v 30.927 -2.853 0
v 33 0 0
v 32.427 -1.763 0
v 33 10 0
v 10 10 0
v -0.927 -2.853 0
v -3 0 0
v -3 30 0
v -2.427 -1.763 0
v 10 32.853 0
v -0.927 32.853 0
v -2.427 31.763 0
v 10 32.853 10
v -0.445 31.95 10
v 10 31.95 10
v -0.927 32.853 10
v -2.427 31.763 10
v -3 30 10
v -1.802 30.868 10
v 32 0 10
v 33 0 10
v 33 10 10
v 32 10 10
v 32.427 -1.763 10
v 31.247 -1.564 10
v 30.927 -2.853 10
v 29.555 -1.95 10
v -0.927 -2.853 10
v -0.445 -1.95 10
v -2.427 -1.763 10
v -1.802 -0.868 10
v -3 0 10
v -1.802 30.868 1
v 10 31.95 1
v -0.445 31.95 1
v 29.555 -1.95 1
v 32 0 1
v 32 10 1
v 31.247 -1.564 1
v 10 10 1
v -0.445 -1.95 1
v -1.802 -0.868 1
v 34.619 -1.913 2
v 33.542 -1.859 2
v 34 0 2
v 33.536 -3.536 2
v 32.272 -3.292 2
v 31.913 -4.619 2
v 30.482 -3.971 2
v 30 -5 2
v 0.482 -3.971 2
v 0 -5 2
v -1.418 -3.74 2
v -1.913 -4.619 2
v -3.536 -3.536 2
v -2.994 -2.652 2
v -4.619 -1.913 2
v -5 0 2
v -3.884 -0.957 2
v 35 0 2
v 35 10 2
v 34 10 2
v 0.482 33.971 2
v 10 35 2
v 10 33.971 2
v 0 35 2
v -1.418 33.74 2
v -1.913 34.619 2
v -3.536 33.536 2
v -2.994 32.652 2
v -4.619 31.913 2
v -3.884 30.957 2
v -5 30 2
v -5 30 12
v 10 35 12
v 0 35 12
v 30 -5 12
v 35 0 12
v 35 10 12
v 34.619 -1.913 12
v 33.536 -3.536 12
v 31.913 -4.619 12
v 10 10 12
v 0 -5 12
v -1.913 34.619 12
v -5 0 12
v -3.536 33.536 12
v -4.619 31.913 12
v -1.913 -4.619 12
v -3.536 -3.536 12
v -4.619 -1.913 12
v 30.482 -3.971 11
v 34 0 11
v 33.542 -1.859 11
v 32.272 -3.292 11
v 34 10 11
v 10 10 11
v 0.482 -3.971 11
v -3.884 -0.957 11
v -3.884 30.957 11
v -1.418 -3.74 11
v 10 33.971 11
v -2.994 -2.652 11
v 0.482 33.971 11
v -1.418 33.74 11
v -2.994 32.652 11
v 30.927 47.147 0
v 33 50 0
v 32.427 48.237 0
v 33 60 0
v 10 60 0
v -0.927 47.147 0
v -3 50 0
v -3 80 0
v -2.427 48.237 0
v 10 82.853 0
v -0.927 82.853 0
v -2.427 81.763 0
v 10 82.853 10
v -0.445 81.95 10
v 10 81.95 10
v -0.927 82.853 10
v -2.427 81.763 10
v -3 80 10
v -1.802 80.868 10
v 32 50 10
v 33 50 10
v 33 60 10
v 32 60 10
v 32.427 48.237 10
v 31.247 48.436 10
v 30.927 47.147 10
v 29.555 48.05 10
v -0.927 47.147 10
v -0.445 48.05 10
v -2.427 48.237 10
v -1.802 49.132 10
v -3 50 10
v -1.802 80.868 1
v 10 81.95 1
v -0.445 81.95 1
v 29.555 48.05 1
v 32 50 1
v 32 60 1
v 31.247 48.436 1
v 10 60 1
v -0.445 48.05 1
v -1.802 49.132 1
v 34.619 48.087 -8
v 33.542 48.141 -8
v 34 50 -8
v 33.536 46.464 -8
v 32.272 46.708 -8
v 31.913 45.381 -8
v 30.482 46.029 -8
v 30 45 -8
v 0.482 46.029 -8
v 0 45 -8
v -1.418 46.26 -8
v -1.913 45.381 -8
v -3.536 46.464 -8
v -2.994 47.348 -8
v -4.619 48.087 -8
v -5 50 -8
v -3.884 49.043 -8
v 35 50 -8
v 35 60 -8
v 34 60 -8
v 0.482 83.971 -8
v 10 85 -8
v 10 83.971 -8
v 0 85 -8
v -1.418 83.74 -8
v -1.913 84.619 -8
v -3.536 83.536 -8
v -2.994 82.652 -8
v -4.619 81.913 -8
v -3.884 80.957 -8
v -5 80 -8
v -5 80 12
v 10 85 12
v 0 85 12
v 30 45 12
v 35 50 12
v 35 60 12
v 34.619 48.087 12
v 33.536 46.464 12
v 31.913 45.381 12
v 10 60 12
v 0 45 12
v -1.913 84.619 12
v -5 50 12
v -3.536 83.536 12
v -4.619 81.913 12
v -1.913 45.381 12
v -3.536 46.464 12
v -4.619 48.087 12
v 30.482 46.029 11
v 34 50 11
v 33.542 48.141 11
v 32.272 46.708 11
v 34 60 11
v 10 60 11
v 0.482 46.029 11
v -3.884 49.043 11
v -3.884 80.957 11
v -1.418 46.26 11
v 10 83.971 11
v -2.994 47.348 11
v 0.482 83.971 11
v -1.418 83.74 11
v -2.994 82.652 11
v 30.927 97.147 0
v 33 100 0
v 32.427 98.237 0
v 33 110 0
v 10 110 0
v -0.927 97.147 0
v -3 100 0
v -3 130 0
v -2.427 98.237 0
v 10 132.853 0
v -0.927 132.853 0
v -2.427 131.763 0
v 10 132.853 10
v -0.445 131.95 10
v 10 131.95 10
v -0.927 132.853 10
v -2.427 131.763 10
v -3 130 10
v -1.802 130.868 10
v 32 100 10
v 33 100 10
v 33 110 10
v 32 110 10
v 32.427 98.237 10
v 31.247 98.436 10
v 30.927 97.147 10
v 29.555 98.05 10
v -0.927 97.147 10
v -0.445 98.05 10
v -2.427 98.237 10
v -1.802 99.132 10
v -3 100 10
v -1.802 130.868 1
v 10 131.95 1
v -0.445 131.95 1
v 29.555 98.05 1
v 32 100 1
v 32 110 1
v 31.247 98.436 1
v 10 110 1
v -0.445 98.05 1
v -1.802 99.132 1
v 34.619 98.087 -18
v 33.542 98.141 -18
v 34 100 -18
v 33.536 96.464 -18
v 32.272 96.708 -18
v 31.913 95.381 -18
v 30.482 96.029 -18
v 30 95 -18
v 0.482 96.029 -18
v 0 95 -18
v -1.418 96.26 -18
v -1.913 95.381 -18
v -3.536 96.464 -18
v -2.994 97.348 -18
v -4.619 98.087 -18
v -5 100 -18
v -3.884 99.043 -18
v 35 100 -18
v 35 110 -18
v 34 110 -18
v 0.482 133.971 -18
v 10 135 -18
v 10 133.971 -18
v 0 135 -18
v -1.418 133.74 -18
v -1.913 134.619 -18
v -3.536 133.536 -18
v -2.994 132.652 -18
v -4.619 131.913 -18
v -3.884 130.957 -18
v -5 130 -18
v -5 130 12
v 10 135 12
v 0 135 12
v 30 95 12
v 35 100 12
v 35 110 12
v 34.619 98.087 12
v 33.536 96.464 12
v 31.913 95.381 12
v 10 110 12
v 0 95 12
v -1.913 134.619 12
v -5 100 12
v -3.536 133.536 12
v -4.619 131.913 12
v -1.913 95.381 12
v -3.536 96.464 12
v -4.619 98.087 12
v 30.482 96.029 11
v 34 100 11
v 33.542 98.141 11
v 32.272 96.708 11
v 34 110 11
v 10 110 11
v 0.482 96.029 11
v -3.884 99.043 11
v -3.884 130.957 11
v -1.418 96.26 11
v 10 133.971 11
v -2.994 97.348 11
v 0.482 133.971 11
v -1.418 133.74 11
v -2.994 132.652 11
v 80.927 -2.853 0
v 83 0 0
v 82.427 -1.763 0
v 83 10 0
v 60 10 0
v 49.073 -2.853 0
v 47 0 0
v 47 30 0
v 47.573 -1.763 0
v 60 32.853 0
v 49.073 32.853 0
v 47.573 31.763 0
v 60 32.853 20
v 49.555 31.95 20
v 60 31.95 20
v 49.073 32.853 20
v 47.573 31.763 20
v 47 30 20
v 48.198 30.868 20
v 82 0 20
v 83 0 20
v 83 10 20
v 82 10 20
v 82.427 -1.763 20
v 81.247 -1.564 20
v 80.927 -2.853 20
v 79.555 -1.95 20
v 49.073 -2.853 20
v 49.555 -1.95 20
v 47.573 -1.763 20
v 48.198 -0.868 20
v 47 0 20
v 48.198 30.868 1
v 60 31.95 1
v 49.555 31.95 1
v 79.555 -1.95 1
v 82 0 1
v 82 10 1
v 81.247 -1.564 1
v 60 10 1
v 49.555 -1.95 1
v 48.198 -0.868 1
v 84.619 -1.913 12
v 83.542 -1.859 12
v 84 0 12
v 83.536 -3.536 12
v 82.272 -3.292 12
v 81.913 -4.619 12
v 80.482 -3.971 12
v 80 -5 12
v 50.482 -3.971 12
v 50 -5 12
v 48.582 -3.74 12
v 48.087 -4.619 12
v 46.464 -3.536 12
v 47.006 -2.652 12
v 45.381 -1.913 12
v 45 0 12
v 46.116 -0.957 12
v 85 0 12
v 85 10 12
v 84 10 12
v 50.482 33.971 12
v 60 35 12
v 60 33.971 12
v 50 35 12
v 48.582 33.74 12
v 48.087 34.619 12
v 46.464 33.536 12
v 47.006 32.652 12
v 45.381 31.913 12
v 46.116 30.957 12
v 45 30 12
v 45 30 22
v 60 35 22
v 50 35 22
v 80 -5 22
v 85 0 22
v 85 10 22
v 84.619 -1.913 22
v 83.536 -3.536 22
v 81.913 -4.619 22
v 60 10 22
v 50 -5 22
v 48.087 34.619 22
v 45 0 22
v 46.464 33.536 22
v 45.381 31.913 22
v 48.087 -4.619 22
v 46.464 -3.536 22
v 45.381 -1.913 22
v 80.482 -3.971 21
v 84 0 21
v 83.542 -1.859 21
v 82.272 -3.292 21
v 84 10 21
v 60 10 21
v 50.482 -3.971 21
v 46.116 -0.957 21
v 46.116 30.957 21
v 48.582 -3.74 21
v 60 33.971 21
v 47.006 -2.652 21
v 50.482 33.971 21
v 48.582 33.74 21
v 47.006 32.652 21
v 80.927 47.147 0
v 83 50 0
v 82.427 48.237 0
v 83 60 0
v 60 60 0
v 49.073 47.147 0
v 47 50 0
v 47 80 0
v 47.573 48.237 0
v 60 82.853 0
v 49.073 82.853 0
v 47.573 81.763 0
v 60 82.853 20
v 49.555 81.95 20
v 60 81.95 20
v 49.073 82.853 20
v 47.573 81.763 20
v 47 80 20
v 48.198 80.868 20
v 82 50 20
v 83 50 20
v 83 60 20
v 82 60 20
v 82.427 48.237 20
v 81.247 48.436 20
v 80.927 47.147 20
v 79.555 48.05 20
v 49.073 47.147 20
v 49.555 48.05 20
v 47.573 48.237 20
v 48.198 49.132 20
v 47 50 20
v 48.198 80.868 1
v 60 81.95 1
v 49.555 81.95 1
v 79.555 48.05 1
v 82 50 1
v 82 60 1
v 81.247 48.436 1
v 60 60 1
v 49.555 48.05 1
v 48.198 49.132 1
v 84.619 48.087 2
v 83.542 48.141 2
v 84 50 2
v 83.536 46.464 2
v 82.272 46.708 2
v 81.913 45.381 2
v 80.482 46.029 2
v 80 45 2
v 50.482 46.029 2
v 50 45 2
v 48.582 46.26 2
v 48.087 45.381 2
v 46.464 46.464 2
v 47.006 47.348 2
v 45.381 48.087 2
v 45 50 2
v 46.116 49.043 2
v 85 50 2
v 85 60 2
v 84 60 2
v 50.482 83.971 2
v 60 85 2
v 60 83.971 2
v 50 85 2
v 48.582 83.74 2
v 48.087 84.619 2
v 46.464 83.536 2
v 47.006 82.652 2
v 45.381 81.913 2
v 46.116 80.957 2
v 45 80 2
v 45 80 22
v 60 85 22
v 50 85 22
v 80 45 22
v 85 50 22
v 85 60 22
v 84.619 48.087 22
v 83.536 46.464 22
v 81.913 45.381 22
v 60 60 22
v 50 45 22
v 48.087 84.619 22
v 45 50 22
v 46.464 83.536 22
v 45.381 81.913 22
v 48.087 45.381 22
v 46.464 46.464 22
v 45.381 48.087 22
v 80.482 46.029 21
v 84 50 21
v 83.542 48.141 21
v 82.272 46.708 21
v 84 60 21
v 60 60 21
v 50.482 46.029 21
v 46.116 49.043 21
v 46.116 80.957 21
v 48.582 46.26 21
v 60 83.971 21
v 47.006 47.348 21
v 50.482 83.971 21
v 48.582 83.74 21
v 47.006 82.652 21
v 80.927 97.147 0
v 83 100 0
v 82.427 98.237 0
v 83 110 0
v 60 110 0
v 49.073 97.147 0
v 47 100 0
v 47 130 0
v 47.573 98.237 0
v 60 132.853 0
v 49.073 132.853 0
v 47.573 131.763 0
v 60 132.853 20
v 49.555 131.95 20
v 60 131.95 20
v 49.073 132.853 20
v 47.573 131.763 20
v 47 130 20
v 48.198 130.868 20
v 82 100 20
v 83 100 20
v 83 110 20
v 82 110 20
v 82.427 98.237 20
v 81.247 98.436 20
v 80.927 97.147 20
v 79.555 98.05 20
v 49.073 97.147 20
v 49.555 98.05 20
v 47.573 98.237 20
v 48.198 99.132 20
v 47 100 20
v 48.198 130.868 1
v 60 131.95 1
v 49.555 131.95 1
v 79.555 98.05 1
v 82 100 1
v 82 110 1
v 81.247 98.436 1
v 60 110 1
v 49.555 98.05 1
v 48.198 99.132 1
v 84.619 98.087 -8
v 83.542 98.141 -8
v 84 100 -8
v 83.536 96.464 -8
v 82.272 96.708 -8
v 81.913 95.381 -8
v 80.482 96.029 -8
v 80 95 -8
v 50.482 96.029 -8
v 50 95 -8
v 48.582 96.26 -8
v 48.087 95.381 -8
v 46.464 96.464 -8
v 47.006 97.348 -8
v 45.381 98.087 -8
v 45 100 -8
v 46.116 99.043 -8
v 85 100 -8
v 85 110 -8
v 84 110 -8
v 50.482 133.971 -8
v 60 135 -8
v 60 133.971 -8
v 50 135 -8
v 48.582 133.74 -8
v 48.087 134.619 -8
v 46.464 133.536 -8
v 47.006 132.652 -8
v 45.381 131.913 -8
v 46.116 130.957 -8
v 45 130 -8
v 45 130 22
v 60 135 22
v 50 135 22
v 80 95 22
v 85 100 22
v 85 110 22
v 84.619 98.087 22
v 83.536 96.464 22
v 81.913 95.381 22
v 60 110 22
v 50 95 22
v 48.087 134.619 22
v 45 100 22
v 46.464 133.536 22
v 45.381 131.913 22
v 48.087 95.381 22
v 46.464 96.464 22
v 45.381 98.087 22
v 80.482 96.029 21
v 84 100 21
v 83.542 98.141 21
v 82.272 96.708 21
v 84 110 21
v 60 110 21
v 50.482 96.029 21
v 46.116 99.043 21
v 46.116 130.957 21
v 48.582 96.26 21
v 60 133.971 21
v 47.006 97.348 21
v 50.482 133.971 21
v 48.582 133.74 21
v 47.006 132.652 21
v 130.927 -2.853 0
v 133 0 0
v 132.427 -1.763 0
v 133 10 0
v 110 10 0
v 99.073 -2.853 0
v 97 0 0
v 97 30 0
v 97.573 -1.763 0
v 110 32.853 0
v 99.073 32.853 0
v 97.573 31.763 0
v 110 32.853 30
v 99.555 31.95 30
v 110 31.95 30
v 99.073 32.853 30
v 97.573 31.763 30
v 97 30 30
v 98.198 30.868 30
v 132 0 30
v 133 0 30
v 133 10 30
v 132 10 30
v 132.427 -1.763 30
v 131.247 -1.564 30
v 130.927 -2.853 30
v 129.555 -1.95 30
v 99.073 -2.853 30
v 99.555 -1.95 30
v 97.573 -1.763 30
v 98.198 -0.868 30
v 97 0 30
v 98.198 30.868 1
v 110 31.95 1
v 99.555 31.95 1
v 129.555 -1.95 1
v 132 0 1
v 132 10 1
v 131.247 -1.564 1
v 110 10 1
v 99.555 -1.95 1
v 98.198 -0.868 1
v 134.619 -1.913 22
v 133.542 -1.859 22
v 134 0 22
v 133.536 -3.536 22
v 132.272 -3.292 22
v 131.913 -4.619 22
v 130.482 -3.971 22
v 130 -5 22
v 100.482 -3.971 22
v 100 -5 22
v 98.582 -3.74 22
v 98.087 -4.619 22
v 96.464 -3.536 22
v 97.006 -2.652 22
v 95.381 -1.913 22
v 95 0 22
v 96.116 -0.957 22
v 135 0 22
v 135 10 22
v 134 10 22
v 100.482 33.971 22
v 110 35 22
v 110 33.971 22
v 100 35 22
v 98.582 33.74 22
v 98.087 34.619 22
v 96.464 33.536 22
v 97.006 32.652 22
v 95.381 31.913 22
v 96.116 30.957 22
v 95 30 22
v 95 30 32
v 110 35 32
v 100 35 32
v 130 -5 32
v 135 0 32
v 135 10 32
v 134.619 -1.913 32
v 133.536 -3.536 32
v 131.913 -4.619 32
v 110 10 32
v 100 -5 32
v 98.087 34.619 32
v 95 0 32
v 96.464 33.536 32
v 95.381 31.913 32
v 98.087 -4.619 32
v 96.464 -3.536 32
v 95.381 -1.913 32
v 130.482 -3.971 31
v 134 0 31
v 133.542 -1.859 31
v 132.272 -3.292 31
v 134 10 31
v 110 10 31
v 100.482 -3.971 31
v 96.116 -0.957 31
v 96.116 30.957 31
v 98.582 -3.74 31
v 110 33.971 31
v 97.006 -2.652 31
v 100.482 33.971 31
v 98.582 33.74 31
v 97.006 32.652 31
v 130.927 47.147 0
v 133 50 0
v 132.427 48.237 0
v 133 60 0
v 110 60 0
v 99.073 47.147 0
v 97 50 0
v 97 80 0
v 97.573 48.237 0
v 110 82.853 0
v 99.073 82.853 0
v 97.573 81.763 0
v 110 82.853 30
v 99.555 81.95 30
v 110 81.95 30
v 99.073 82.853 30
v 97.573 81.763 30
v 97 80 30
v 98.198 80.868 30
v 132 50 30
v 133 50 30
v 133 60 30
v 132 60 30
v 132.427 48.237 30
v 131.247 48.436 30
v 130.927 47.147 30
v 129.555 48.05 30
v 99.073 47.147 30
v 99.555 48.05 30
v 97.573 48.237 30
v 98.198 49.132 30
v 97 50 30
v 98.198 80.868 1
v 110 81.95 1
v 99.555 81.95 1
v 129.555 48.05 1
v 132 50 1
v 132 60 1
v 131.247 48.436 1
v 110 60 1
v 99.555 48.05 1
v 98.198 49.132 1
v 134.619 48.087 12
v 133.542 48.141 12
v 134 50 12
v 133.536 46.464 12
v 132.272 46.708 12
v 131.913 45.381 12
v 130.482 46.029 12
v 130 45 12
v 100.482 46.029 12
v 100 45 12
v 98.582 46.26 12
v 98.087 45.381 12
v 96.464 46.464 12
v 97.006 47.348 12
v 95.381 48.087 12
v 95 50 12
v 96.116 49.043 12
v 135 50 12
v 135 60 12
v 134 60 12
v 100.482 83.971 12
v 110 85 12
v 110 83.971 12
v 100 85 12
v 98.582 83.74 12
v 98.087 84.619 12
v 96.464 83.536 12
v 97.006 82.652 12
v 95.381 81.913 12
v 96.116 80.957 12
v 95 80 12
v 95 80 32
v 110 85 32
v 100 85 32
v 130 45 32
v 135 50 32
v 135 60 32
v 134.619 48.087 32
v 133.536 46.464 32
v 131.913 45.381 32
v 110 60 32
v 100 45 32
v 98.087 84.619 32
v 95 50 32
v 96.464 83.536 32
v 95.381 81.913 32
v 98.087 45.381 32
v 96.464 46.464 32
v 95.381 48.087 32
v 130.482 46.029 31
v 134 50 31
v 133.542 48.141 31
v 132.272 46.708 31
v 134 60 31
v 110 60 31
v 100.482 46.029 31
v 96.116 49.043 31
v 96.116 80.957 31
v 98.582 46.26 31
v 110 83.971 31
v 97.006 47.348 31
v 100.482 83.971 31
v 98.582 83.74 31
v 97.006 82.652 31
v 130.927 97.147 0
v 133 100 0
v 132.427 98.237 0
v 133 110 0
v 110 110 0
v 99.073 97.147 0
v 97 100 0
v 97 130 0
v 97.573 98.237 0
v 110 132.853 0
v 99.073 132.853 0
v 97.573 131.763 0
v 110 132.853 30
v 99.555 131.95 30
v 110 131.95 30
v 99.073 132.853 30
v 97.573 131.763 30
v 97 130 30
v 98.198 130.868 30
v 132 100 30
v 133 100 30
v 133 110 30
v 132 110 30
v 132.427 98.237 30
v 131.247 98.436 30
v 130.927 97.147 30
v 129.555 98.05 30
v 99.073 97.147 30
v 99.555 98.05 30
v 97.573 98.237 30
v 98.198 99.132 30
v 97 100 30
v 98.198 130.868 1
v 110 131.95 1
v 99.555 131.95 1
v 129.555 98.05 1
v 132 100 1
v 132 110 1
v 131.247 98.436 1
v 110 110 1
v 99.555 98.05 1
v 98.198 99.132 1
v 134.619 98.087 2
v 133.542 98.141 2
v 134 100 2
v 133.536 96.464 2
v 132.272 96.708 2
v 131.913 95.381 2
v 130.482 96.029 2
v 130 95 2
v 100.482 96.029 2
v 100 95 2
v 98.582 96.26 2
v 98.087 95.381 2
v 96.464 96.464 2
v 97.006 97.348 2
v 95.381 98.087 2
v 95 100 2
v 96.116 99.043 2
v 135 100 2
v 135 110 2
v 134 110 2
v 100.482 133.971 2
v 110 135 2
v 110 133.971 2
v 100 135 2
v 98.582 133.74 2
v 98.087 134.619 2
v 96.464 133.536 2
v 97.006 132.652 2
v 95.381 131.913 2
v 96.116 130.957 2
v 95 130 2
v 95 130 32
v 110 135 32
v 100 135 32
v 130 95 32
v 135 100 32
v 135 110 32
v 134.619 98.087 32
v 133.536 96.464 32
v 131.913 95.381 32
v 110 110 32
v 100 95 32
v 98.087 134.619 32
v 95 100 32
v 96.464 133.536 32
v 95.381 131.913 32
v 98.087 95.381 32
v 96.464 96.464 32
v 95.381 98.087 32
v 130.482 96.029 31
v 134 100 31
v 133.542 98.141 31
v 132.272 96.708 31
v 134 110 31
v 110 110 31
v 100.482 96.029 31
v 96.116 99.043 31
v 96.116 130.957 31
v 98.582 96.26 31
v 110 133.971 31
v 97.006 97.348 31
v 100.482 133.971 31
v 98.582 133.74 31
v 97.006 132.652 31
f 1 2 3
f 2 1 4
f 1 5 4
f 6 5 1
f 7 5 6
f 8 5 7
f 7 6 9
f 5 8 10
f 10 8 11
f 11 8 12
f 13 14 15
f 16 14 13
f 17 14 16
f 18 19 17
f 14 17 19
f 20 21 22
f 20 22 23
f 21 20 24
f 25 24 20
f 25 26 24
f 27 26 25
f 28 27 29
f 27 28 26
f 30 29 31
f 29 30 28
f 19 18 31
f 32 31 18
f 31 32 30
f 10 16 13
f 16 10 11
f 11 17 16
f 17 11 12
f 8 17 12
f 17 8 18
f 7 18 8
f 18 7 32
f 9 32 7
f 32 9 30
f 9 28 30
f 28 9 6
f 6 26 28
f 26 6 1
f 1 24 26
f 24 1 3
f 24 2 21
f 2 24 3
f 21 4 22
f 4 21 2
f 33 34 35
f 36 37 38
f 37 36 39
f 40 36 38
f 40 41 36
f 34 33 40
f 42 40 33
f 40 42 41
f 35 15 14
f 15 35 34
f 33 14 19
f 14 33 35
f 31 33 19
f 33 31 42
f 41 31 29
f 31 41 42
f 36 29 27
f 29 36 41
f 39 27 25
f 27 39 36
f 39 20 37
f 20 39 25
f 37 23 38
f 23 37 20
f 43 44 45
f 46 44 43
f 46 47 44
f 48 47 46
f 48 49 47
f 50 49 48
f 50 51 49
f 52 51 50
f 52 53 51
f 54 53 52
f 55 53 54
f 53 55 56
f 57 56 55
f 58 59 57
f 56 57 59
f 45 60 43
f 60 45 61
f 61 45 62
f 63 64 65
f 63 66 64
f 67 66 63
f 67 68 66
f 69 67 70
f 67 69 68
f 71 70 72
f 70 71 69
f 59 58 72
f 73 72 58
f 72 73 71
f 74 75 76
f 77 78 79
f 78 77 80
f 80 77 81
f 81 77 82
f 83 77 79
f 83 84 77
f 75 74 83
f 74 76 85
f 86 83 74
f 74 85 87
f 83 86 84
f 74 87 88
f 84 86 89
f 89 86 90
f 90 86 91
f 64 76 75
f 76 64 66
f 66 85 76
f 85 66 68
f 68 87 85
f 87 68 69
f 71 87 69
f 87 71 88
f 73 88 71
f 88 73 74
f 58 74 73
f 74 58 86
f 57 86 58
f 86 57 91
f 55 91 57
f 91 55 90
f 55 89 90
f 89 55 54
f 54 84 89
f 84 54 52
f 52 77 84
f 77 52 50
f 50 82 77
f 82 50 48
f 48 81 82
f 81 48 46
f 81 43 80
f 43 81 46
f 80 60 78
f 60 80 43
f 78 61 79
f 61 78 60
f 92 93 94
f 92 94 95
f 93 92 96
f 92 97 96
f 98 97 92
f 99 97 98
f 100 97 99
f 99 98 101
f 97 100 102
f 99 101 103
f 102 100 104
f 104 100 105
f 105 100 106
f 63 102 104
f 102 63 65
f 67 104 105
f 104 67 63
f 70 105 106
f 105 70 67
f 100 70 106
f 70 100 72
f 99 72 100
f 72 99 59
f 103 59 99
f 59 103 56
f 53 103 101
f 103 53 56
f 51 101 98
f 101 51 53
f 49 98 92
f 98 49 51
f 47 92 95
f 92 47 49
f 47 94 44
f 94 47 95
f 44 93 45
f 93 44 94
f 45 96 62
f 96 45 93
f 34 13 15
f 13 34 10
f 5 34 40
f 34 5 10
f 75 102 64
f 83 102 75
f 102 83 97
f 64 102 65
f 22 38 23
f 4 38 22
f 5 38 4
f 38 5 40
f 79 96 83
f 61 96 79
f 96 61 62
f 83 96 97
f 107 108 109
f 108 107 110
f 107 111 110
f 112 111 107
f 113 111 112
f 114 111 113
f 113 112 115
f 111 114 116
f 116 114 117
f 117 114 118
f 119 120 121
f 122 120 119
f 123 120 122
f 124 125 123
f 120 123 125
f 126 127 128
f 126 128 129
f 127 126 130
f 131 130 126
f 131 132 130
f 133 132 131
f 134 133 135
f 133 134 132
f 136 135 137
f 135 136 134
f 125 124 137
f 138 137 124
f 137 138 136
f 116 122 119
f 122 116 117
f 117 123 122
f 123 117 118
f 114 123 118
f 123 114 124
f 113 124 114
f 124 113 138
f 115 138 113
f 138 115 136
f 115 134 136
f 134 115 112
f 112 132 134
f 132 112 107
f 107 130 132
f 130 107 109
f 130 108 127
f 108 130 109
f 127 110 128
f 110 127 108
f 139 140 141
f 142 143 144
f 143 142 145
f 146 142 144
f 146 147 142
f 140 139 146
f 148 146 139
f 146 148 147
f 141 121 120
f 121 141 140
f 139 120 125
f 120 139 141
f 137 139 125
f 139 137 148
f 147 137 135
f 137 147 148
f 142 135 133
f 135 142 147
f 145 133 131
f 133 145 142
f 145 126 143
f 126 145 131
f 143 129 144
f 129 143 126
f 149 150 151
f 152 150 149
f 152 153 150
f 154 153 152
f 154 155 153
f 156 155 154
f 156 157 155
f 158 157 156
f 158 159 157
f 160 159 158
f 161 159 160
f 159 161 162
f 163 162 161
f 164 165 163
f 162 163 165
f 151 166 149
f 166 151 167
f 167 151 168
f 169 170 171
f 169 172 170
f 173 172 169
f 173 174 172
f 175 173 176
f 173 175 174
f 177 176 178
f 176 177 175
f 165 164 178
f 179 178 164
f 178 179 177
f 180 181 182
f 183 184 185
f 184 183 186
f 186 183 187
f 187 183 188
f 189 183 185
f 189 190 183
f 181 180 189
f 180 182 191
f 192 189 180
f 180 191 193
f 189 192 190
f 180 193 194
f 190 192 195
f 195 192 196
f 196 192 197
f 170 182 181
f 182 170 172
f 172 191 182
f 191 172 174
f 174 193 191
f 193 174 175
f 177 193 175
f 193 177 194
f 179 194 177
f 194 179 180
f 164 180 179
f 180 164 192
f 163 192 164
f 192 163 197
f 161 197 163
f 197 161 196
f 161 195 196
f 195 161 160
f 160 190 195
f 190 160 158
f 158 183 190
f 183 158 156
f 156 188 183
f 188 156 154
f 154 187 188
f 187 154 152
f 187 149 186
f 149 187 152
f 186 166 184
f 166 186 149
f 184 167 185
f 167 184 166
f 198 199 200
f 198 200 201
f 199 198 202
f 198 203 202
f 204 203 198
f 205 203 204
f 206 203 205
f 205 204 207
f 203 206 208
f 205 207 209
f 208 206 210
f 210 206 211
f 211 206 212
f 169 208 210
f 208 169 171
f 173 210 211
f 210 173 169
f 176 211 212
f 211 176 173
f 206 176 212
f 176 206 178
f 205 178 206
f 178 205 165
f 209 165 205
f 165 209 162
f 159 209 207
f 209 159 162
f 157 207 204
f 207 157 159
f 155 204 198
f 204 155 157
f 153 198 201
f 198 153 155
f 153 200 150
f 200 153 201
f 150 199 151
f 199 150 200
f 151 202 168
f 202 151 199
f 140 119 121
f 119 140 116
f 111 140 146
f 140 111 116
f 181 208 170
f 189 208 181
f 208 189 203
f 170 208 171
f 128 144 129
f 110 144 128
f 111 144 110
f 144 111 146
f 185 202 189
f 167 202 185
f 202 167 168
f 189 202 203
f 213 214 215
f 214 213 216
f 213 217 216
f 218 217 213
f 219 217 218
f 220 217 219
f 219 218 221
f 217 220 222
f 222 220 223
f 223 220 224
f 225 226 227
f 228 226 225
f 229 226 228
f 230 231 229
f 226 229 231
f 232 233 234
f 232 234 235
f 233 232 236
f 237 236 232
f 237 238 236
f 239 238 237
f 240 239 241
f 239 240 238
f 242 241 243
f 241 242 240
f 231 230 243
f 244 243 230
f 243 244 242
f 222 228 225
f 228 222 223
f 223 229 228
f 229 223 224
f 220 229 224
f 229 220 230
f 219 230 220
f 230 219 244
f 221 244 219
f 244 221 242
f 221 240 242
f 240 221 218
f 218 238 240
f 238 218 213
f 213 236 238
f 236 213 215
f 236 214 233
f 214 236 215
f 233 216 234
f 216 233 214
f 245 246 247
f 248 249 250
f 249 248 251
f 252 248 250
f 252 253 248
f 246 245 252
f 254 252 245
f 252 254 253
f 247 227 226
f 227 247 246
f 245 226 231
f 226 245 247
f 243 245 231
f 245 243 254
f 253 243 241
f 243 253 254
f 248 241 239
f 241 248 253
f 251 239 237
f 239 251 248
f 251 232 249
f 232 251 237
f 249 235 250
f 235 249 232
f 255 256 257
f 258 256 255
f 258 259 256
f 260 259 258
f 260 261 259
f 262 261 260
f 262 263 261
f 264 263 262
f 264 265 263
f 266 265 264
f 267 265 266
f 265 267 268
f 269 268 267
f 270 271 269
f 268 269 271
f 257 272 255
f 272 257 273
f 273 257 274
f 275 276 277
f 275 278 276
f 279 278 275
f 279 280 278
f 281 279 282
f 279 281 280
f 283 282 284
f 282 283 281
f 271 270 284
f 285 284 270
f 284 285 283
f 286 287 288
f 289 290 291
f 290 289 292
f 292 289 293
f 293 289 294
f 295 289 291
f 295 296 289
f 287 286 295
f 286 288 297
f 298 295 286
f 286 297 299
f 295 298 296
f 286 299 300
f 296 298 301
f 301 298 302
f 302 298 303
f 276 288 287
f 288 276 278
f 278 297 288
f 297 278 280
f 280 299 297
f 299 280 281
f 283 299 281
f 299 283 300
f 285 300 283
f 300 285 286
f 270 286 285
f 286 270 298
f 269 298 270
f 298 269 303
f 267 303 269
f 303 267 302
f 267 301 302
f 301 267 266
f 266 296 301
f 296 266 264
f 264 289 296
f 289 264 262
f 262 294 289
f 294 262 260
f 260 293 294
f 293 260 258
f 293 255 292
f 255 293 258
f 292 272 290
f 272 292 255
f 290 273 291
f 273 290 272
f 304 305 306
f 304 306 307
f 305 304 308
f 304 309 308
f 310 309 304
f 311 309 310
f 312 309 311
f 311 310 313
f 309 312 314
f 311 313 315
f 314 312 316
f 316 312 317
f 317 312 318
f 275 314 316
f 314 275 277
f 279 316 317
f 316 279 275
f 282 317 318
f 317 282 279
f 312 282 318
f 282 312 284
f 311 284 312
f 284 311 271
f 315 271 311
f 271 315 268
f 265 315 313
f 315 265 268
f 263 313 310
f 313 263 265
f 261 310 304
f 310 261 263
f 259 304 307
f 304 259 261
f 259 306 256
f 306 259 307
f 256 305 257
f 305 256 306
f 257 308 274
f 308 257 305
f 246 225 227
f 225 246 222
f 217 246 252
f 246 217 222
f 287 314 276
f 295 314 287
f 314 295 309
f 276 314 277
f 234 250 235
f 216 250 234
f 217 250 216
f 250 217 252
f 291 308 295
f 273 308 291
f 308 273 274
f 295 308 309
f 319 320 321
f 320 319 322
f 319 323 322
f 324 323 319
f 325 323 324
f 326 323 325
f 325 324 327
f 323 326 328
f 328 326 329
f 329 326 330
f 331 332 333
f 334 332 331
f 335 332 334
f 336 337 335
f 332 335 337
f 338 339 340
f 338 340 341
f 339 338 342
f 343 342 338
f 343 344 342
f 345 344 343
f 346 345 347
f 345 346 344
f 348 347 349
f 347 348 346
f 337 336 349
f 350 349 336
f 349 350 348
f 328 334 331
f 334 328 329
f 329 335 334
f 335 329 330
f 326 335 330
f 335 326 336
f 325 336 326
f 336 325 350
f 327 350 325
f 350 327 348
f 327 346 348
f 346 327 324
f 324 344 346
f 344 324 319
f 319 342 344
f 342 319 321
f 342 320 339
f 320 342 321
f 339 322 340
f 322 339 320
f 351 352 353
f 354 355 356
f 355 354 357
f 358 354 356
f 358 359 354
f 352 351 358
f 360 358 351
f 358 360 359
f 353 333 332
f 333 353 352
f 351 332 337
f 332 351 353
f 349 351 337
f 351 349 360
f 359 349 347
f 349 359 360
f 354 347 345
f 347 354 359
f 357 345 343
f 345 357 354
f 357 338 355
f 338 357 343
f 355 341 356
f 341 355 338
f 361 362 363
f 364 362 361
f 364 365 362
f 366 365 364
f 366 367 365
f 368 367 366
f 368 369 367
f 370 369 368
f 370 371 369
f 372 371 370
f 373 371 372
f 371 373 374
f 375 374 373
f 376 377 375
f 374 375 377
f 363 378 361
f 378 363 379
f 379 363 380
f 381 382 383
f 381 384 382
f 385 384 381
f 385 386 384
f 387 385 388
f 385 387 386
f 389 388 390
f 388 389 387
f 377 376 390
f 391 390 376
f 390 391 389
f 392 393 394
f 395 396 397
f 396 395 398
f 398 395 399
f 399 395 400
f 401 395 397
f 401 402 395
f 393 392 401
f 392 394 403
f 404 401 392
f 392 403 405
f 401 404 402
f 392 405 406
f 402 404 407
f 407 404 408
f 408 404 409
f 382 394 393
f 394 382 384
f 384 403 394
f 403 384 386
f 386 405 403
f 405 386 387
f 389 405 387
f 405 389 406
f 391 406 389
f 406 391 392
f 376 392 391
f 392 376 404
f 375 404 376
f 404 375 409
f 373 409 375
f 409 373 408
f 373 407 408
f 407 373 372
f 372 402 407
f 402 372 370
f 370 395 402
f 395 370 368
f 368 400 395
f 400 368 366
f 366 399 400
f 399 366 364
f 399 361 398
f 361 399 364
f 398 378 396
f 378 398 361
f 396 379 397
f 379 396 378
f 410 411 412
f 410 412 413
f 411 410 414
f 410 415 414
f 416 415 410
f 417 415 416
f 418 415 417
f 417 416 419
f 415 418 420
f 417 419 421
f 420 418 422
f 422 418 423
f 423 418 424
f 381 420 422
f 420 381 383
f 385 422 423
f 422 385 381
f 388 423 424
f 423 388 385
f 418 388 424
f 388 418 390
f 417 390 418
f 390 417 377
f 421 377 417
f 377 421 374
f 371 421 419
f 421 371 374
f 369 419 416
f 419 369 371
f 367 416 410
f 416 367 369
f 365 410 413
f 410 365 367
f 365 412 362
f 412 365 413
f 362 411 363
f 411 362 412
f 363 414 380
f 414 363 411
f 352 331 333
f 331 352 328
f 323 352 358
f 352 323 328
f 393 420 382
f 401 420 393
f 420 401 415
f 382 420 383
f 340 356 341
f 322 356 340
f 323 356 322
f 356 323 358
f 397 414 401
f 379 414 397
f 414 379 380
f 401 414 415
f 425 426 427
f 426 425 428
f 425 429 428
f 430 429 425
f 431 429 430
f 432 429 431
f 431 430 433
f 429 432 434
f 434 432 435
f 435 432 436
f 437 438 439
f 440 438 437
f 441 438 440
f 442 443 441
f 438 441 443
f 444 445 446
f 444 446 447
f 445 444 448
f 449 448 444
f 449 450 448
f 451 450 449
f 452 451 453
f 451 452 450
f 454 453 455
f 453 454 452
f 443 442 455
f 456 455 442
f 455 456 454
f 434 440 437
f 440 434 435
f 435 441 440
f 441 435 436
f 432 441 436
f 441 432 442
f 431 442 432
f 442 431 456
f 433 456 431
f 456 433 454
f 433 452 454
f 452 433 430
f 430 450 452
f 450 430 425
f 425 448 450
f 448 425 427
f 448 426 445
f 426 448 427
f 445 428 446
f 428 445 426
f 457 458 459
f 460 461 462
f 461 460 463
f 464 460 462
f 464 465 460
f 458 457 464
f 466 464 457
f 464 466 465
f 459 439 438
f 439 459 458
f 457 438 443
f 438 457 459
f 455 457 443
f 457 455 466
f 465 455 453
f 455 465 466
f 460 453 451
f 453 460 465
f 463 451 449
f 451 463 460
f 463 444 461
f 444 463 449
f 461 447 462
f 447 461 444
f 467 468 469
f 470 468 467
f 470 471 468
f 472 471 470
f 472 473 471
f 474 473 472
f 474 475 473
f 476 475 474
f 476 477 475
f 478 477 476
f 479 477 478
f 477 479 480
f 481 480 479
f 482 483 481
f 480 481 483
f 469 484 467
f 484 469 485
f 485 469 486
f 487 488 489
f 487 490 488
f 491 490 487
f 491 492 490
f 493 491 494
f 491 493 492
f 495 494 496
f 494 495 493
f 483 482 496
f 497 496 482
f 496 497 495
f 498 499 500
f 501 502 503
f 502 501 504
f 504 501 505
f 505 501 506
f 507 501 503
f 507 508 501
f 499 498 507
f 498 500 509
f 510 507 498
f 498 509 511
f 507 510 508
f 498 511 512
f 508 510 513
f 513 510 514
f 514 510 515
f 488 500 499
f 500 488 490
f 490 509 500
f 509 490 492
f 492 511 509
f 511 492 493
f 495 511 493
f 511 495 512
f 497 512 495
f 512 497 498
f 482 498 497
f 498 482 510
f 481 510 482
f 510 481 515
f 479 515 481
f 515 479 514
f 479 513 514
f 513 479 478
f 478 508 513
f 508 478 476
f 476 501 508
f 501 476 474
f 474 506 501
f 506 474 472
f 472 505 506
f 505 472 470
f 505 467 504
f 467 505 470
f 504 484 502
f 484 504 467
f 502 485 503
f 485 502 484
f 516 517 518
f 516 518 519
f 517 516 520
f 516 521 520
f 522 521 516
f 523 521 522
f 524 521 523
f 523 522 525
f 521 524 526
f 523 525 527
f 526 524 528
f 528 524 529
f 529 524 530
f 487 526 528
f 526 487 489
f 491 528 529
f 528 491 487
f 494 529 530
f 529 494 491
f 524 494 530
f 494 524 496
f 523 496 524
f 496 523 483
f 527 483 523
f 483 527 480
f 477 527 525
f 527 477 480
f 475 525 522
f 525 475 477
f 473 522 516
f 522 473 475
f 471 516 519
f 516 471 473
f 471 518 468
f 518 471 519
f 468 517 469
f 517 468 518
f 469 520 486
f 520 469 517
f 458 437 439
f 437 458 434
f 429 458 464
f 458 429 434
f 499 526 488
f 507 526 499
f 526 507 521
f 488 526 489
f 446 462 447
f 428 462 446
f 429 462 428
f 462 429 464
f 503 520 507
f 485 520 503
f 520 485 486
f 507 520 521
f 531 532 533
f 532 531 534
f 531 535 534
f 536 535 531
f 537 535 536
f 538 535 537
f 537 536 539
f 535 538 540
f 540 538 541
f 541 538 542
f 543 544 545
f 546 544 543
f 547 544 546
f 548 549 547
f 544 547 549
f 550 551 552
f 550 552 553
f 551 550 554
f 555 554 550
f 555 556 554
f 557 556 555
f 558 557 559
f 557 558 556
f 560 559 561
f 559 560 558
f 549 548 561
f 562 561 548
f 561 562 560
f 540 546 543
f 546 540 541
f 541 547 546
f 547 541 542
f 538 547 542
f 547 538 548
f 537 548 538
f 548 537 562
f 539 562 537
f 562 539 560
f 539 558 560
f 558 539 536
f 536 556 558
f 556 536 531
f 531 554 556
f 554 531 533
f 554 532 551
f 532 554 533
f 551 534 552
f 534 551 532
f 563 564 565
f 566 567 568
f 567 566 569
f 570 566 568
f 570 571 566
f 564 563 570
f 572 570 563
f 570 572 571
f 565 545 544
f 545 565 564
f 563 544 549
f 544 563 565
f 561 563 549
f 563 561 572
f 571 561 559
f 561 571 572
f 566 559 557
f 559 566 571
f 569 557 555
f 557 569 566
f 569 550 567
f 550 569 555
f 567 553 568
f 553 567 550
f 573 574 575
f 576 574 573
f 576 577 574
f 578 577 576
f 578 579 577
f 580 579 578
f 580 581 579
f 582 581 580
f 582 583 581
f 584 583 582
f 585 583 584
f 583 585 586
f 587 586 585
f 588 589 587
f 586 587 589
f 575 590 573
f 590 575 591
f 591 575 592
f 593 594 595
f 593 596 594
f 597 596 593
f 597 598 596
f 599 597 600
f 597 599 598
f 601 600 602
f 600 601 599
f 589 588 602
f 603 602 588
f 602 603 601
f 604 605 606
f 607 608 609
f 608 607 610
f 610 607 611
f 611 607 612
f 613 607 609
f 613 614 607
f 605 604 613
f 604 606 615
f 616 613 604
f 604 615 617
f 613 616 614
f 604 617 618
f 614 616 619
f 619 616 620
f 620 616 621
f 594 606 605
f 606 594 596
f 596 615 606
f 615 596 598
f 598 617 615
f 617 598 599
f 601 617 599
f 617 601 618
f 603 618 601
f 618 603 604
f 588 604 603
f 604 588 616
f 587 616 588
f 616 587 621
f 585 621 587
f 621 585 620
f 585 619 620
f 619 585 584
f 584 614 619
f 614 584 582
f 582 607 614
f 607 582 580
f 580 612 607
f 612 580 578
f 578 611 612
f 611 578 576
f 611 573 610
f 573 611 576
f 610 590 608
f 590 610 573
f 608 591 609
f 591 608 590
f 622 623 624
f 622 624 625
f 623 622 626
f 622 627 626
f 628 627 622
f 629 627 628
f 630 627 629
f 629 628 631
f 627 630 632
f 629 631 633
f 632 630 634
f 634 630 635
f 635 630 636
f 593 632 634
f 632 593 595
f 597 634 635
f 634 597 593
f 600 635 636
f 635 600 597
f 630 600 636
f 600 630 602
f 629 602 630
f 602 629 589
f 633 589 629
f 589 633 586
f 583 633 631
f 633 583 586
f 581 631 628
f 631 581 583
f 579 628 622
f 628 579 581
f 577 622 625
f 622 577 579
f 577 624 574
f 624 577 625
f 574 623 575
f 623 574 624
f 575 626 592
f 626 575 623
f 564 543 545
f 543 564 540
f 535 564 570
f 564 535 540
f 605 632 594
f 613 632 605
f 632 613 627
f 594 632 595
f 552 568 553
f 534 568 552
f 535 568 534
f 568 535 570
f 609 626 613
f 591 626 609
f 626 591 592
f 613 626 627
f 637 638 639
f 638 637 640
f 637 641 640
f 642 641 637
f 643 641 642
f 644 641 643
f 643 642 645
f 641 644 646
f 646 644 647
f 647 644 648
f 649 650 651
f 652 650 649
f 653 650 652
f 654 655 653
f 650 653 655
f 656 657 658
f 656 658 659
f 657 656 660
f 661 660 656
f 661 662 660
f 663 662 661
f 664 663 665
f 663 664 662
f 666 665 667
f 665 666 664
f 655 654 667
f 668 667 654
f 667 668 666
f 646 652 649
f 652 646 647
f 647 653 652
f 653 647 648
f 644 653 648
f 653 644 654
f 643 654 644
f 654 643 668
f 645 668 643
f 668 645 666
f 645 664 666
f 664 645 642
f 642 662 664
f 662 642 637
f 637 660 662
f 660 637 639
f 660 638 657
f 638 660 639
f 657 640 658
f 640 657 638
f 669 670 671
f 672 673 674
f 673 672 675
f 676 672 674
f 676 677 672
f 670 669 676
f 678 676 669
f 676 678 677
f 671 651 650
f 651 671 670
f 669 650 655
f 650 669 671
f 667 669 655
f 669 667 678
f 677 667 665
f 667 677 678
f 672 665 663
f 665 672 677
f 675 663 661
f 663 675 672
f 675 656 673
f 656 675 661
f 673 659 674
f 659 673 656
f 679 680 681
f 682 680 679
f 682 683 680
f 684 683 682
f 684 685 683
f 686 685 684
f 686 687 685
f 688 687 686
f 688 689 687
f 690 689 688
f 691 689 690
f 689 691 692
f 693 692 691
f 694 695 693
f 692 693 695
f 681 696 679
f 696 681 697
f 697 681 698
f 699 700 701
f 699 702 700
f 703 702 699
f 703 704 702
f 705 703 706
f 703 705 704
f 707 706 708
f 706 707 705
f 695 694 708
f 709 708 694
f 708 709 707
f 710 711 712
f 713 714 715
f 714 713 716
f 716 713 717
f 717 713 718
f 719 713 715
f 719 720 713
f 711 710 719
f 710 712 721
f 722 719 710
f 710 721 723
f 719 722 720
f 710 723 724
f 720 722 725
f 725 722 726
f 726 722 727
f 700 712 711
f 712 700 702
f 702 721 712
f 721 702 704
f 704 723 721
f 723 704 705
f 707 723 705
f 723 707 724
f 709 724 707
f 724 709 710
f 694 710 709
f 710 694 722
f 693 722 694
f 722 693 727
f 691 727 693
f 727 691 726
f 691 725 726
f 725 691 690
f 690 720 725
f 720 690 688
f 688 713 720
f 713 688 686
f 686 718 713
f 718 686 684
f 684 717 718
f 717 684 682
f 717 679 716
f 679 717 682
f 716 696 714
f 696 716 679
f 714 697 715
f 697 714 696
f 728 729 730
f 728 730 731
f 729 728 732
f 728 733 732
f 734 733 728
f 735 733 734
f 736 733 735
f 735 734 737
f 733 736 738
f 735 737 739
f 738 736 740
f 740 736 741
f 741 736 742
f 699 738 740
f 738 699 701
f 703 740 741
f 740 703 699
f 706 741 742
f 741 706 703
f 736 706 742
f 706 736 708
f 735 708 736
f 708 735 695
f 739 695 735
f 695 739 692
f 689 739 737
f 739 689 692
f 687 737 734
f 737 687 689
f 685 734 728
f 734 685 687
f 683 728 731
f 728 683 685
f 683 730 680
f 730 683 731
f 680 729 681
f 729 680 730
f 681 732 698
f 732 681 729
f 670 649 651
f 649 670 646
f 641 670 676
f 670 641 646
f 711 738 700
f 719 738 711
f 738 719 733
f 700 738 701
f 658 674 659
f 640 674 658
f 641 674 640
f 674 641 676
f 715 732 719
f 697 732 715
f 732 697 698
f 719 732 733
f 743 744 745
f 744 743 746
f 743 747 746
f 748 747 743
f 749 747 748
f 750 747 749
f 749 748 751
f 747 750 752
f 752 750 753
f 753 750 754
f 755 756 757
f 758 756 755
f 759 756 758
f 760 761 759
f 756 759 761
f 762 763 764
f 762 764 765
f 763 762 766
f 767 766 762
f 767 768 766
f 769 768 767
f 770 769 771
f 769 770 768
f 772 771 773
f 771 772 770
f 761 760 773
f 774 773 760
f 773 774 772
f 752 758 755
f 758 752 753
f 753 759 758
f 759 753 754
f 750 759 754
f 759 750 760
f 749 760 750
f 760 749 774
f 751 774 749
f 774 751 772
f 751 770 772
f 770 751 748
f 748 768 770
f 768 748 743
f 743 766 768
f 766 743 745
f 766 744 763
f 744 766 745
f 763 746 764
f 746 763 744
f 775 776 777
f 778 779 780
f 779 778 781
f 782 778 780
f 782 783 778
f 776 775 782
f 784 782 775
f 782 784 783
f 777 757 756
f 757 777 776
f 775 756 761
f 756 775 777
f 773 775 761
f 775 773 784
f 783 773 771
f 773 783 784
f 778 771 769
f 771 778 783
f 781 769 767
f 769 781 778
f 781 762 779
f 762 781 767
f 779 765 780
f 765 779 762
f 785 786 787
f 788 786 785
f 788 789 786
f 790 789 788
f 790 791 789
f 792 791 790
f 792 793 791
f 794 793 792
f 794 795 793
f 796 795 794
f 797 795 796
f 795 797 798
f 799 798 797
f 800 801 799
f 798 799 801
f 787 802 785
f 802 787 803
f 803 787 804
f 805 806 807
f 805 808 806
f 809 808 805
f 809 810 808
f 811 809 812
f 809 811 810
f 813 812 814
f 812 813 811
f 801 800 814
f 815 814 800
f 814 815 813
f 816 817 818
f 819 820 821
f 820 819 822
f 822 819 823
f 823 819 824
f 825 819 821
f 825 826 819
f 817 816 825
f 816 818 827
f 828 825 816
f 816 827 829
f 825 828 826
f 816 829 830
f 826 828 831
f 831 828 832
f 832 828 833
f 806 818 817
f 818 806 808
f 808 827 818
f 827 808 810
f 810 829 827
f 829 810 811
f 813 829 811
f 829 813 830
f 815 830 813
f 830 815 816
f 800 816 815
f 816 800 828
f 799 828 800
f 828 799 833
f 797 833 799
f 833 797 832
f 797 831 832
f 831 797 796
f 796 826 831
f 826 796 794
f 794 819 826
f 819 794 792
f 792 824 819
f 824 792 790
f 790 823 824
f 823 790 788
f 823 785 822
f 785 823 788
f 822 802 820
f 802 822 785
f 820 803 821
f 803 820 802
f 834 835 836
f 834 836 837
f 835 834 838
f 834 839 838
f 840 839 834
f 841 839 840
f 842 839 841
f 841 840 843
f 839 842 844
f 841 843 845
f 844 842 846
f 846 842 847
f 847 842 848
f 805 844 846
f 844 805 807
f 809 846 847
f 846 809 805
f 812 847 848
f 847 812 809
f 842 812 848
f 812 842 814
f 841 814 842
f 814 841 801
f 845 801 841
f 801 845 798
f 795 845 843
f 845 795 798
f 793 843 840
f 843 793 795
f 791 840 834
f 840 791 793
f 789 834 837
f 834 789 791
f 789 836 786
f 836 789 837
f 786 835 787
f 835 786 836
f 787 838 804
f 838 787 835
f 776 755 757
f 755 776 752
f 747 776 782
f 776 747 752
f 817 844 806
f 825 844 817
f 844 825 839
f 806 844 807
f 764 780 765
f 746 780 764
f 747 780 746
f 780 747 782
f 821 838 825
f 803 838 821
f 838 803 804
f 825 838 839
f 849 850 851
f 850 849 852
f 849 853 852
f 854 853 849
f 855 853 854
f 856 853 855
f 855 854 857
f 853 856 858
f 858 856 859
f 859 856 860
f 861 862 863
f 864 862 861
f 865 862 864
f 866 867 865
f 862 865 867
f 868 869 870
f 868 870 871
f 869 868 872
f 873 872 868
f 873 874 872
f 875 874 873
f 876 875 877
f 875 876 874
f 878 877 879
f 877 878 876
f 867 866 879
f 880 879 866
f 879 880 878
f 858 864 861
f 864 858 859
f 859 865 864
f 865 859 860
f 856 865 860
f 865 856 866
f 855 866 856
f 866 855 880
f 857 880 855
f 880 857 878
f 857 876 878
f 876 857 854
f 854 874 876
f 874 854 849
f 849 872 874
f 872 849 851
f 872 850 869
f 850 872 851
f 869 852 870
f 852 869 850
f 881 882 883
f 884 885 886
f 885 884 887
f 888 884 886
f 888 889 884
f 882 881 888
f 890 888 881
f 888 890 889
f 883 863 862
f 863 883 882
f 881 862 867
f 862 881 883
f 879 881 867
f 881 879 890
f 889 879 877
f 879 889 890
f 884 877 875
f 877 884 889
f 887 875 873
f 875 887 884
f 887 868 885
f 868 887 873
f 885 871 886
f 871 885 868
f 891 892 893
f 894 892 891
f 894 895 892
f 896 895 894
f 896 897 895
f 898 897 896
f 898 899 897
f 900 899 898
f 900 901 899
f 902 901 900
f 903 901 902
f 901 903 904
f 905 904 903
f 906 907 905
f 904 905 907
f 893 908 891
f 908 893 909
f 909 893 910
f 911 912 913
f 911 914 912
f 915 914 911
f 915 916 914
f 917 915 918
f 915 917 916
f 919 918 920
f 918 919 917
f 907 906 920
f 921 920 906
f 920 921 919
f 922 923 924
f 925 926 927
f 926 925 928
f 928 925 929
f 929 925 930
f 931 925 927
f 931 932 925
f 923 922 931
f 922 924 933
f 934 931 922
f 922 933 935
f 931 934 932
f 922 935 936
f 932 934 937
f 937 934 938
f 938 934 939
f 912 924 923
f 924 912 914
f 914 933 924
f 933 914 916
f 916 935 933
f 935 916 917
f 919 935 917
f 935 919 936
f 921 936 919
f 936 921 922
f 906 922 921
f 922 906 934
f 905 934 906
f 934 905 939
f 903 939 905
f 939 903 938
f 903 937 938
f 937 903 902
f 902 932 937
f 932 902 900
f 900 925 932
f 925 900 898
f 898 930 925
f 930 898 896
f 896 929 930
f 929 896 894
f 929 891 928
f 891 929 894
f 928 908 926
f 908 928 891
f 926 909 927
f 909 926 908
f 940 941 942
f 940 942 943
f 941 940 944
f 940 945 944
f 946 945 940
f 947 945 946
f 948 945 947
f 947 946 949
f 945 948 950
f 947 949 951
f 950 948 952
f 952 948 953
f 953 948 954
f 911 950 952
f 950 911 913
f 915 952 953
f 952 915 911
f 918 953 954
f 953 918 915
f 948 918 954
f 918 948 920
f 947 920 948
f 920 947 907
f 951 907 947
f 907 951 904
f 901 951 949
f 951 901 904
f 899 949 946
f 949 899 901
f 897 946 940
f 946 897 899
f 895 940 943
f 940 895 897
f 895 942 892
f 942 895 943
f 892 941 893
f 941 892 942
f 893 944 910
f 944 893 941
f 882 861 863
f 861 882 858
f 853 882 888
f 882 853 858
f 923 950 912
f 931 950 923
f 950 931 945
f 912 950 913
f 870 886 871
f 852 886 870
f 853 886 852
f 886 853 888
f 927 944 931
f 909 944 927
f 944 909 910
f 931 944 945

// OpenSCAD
data=[[0,0],[0,30],[18,30],
      [18,15],[30,15],[30,0]];
for(i=[0:2]){
    for(j=[0:2]){
        translate([i*50,j*50]){
            test(i*10+10,j*10+10);
        };
    };
};

module test(a,b){
    difference(){
        assembly(a,b);
        translate([10,10,-30]){
            cube([100,100,100]);
        };
    };
};
module assembly(a,b){
    box(3,1,a);
    translate([0,0,2+a-b]){
        box(5,-1,b);
    };
};

module box(r,t,h){
    difference(){
        linear_extrude(h){
            shape(r);
        };
        translate([0,0,t]){
            linear_extrude(h){
                shape(r-1);
            };
        };
    };
};
module shape(r){
    minkowski(){
        polygon(data);
        circle(r);
    };
};
